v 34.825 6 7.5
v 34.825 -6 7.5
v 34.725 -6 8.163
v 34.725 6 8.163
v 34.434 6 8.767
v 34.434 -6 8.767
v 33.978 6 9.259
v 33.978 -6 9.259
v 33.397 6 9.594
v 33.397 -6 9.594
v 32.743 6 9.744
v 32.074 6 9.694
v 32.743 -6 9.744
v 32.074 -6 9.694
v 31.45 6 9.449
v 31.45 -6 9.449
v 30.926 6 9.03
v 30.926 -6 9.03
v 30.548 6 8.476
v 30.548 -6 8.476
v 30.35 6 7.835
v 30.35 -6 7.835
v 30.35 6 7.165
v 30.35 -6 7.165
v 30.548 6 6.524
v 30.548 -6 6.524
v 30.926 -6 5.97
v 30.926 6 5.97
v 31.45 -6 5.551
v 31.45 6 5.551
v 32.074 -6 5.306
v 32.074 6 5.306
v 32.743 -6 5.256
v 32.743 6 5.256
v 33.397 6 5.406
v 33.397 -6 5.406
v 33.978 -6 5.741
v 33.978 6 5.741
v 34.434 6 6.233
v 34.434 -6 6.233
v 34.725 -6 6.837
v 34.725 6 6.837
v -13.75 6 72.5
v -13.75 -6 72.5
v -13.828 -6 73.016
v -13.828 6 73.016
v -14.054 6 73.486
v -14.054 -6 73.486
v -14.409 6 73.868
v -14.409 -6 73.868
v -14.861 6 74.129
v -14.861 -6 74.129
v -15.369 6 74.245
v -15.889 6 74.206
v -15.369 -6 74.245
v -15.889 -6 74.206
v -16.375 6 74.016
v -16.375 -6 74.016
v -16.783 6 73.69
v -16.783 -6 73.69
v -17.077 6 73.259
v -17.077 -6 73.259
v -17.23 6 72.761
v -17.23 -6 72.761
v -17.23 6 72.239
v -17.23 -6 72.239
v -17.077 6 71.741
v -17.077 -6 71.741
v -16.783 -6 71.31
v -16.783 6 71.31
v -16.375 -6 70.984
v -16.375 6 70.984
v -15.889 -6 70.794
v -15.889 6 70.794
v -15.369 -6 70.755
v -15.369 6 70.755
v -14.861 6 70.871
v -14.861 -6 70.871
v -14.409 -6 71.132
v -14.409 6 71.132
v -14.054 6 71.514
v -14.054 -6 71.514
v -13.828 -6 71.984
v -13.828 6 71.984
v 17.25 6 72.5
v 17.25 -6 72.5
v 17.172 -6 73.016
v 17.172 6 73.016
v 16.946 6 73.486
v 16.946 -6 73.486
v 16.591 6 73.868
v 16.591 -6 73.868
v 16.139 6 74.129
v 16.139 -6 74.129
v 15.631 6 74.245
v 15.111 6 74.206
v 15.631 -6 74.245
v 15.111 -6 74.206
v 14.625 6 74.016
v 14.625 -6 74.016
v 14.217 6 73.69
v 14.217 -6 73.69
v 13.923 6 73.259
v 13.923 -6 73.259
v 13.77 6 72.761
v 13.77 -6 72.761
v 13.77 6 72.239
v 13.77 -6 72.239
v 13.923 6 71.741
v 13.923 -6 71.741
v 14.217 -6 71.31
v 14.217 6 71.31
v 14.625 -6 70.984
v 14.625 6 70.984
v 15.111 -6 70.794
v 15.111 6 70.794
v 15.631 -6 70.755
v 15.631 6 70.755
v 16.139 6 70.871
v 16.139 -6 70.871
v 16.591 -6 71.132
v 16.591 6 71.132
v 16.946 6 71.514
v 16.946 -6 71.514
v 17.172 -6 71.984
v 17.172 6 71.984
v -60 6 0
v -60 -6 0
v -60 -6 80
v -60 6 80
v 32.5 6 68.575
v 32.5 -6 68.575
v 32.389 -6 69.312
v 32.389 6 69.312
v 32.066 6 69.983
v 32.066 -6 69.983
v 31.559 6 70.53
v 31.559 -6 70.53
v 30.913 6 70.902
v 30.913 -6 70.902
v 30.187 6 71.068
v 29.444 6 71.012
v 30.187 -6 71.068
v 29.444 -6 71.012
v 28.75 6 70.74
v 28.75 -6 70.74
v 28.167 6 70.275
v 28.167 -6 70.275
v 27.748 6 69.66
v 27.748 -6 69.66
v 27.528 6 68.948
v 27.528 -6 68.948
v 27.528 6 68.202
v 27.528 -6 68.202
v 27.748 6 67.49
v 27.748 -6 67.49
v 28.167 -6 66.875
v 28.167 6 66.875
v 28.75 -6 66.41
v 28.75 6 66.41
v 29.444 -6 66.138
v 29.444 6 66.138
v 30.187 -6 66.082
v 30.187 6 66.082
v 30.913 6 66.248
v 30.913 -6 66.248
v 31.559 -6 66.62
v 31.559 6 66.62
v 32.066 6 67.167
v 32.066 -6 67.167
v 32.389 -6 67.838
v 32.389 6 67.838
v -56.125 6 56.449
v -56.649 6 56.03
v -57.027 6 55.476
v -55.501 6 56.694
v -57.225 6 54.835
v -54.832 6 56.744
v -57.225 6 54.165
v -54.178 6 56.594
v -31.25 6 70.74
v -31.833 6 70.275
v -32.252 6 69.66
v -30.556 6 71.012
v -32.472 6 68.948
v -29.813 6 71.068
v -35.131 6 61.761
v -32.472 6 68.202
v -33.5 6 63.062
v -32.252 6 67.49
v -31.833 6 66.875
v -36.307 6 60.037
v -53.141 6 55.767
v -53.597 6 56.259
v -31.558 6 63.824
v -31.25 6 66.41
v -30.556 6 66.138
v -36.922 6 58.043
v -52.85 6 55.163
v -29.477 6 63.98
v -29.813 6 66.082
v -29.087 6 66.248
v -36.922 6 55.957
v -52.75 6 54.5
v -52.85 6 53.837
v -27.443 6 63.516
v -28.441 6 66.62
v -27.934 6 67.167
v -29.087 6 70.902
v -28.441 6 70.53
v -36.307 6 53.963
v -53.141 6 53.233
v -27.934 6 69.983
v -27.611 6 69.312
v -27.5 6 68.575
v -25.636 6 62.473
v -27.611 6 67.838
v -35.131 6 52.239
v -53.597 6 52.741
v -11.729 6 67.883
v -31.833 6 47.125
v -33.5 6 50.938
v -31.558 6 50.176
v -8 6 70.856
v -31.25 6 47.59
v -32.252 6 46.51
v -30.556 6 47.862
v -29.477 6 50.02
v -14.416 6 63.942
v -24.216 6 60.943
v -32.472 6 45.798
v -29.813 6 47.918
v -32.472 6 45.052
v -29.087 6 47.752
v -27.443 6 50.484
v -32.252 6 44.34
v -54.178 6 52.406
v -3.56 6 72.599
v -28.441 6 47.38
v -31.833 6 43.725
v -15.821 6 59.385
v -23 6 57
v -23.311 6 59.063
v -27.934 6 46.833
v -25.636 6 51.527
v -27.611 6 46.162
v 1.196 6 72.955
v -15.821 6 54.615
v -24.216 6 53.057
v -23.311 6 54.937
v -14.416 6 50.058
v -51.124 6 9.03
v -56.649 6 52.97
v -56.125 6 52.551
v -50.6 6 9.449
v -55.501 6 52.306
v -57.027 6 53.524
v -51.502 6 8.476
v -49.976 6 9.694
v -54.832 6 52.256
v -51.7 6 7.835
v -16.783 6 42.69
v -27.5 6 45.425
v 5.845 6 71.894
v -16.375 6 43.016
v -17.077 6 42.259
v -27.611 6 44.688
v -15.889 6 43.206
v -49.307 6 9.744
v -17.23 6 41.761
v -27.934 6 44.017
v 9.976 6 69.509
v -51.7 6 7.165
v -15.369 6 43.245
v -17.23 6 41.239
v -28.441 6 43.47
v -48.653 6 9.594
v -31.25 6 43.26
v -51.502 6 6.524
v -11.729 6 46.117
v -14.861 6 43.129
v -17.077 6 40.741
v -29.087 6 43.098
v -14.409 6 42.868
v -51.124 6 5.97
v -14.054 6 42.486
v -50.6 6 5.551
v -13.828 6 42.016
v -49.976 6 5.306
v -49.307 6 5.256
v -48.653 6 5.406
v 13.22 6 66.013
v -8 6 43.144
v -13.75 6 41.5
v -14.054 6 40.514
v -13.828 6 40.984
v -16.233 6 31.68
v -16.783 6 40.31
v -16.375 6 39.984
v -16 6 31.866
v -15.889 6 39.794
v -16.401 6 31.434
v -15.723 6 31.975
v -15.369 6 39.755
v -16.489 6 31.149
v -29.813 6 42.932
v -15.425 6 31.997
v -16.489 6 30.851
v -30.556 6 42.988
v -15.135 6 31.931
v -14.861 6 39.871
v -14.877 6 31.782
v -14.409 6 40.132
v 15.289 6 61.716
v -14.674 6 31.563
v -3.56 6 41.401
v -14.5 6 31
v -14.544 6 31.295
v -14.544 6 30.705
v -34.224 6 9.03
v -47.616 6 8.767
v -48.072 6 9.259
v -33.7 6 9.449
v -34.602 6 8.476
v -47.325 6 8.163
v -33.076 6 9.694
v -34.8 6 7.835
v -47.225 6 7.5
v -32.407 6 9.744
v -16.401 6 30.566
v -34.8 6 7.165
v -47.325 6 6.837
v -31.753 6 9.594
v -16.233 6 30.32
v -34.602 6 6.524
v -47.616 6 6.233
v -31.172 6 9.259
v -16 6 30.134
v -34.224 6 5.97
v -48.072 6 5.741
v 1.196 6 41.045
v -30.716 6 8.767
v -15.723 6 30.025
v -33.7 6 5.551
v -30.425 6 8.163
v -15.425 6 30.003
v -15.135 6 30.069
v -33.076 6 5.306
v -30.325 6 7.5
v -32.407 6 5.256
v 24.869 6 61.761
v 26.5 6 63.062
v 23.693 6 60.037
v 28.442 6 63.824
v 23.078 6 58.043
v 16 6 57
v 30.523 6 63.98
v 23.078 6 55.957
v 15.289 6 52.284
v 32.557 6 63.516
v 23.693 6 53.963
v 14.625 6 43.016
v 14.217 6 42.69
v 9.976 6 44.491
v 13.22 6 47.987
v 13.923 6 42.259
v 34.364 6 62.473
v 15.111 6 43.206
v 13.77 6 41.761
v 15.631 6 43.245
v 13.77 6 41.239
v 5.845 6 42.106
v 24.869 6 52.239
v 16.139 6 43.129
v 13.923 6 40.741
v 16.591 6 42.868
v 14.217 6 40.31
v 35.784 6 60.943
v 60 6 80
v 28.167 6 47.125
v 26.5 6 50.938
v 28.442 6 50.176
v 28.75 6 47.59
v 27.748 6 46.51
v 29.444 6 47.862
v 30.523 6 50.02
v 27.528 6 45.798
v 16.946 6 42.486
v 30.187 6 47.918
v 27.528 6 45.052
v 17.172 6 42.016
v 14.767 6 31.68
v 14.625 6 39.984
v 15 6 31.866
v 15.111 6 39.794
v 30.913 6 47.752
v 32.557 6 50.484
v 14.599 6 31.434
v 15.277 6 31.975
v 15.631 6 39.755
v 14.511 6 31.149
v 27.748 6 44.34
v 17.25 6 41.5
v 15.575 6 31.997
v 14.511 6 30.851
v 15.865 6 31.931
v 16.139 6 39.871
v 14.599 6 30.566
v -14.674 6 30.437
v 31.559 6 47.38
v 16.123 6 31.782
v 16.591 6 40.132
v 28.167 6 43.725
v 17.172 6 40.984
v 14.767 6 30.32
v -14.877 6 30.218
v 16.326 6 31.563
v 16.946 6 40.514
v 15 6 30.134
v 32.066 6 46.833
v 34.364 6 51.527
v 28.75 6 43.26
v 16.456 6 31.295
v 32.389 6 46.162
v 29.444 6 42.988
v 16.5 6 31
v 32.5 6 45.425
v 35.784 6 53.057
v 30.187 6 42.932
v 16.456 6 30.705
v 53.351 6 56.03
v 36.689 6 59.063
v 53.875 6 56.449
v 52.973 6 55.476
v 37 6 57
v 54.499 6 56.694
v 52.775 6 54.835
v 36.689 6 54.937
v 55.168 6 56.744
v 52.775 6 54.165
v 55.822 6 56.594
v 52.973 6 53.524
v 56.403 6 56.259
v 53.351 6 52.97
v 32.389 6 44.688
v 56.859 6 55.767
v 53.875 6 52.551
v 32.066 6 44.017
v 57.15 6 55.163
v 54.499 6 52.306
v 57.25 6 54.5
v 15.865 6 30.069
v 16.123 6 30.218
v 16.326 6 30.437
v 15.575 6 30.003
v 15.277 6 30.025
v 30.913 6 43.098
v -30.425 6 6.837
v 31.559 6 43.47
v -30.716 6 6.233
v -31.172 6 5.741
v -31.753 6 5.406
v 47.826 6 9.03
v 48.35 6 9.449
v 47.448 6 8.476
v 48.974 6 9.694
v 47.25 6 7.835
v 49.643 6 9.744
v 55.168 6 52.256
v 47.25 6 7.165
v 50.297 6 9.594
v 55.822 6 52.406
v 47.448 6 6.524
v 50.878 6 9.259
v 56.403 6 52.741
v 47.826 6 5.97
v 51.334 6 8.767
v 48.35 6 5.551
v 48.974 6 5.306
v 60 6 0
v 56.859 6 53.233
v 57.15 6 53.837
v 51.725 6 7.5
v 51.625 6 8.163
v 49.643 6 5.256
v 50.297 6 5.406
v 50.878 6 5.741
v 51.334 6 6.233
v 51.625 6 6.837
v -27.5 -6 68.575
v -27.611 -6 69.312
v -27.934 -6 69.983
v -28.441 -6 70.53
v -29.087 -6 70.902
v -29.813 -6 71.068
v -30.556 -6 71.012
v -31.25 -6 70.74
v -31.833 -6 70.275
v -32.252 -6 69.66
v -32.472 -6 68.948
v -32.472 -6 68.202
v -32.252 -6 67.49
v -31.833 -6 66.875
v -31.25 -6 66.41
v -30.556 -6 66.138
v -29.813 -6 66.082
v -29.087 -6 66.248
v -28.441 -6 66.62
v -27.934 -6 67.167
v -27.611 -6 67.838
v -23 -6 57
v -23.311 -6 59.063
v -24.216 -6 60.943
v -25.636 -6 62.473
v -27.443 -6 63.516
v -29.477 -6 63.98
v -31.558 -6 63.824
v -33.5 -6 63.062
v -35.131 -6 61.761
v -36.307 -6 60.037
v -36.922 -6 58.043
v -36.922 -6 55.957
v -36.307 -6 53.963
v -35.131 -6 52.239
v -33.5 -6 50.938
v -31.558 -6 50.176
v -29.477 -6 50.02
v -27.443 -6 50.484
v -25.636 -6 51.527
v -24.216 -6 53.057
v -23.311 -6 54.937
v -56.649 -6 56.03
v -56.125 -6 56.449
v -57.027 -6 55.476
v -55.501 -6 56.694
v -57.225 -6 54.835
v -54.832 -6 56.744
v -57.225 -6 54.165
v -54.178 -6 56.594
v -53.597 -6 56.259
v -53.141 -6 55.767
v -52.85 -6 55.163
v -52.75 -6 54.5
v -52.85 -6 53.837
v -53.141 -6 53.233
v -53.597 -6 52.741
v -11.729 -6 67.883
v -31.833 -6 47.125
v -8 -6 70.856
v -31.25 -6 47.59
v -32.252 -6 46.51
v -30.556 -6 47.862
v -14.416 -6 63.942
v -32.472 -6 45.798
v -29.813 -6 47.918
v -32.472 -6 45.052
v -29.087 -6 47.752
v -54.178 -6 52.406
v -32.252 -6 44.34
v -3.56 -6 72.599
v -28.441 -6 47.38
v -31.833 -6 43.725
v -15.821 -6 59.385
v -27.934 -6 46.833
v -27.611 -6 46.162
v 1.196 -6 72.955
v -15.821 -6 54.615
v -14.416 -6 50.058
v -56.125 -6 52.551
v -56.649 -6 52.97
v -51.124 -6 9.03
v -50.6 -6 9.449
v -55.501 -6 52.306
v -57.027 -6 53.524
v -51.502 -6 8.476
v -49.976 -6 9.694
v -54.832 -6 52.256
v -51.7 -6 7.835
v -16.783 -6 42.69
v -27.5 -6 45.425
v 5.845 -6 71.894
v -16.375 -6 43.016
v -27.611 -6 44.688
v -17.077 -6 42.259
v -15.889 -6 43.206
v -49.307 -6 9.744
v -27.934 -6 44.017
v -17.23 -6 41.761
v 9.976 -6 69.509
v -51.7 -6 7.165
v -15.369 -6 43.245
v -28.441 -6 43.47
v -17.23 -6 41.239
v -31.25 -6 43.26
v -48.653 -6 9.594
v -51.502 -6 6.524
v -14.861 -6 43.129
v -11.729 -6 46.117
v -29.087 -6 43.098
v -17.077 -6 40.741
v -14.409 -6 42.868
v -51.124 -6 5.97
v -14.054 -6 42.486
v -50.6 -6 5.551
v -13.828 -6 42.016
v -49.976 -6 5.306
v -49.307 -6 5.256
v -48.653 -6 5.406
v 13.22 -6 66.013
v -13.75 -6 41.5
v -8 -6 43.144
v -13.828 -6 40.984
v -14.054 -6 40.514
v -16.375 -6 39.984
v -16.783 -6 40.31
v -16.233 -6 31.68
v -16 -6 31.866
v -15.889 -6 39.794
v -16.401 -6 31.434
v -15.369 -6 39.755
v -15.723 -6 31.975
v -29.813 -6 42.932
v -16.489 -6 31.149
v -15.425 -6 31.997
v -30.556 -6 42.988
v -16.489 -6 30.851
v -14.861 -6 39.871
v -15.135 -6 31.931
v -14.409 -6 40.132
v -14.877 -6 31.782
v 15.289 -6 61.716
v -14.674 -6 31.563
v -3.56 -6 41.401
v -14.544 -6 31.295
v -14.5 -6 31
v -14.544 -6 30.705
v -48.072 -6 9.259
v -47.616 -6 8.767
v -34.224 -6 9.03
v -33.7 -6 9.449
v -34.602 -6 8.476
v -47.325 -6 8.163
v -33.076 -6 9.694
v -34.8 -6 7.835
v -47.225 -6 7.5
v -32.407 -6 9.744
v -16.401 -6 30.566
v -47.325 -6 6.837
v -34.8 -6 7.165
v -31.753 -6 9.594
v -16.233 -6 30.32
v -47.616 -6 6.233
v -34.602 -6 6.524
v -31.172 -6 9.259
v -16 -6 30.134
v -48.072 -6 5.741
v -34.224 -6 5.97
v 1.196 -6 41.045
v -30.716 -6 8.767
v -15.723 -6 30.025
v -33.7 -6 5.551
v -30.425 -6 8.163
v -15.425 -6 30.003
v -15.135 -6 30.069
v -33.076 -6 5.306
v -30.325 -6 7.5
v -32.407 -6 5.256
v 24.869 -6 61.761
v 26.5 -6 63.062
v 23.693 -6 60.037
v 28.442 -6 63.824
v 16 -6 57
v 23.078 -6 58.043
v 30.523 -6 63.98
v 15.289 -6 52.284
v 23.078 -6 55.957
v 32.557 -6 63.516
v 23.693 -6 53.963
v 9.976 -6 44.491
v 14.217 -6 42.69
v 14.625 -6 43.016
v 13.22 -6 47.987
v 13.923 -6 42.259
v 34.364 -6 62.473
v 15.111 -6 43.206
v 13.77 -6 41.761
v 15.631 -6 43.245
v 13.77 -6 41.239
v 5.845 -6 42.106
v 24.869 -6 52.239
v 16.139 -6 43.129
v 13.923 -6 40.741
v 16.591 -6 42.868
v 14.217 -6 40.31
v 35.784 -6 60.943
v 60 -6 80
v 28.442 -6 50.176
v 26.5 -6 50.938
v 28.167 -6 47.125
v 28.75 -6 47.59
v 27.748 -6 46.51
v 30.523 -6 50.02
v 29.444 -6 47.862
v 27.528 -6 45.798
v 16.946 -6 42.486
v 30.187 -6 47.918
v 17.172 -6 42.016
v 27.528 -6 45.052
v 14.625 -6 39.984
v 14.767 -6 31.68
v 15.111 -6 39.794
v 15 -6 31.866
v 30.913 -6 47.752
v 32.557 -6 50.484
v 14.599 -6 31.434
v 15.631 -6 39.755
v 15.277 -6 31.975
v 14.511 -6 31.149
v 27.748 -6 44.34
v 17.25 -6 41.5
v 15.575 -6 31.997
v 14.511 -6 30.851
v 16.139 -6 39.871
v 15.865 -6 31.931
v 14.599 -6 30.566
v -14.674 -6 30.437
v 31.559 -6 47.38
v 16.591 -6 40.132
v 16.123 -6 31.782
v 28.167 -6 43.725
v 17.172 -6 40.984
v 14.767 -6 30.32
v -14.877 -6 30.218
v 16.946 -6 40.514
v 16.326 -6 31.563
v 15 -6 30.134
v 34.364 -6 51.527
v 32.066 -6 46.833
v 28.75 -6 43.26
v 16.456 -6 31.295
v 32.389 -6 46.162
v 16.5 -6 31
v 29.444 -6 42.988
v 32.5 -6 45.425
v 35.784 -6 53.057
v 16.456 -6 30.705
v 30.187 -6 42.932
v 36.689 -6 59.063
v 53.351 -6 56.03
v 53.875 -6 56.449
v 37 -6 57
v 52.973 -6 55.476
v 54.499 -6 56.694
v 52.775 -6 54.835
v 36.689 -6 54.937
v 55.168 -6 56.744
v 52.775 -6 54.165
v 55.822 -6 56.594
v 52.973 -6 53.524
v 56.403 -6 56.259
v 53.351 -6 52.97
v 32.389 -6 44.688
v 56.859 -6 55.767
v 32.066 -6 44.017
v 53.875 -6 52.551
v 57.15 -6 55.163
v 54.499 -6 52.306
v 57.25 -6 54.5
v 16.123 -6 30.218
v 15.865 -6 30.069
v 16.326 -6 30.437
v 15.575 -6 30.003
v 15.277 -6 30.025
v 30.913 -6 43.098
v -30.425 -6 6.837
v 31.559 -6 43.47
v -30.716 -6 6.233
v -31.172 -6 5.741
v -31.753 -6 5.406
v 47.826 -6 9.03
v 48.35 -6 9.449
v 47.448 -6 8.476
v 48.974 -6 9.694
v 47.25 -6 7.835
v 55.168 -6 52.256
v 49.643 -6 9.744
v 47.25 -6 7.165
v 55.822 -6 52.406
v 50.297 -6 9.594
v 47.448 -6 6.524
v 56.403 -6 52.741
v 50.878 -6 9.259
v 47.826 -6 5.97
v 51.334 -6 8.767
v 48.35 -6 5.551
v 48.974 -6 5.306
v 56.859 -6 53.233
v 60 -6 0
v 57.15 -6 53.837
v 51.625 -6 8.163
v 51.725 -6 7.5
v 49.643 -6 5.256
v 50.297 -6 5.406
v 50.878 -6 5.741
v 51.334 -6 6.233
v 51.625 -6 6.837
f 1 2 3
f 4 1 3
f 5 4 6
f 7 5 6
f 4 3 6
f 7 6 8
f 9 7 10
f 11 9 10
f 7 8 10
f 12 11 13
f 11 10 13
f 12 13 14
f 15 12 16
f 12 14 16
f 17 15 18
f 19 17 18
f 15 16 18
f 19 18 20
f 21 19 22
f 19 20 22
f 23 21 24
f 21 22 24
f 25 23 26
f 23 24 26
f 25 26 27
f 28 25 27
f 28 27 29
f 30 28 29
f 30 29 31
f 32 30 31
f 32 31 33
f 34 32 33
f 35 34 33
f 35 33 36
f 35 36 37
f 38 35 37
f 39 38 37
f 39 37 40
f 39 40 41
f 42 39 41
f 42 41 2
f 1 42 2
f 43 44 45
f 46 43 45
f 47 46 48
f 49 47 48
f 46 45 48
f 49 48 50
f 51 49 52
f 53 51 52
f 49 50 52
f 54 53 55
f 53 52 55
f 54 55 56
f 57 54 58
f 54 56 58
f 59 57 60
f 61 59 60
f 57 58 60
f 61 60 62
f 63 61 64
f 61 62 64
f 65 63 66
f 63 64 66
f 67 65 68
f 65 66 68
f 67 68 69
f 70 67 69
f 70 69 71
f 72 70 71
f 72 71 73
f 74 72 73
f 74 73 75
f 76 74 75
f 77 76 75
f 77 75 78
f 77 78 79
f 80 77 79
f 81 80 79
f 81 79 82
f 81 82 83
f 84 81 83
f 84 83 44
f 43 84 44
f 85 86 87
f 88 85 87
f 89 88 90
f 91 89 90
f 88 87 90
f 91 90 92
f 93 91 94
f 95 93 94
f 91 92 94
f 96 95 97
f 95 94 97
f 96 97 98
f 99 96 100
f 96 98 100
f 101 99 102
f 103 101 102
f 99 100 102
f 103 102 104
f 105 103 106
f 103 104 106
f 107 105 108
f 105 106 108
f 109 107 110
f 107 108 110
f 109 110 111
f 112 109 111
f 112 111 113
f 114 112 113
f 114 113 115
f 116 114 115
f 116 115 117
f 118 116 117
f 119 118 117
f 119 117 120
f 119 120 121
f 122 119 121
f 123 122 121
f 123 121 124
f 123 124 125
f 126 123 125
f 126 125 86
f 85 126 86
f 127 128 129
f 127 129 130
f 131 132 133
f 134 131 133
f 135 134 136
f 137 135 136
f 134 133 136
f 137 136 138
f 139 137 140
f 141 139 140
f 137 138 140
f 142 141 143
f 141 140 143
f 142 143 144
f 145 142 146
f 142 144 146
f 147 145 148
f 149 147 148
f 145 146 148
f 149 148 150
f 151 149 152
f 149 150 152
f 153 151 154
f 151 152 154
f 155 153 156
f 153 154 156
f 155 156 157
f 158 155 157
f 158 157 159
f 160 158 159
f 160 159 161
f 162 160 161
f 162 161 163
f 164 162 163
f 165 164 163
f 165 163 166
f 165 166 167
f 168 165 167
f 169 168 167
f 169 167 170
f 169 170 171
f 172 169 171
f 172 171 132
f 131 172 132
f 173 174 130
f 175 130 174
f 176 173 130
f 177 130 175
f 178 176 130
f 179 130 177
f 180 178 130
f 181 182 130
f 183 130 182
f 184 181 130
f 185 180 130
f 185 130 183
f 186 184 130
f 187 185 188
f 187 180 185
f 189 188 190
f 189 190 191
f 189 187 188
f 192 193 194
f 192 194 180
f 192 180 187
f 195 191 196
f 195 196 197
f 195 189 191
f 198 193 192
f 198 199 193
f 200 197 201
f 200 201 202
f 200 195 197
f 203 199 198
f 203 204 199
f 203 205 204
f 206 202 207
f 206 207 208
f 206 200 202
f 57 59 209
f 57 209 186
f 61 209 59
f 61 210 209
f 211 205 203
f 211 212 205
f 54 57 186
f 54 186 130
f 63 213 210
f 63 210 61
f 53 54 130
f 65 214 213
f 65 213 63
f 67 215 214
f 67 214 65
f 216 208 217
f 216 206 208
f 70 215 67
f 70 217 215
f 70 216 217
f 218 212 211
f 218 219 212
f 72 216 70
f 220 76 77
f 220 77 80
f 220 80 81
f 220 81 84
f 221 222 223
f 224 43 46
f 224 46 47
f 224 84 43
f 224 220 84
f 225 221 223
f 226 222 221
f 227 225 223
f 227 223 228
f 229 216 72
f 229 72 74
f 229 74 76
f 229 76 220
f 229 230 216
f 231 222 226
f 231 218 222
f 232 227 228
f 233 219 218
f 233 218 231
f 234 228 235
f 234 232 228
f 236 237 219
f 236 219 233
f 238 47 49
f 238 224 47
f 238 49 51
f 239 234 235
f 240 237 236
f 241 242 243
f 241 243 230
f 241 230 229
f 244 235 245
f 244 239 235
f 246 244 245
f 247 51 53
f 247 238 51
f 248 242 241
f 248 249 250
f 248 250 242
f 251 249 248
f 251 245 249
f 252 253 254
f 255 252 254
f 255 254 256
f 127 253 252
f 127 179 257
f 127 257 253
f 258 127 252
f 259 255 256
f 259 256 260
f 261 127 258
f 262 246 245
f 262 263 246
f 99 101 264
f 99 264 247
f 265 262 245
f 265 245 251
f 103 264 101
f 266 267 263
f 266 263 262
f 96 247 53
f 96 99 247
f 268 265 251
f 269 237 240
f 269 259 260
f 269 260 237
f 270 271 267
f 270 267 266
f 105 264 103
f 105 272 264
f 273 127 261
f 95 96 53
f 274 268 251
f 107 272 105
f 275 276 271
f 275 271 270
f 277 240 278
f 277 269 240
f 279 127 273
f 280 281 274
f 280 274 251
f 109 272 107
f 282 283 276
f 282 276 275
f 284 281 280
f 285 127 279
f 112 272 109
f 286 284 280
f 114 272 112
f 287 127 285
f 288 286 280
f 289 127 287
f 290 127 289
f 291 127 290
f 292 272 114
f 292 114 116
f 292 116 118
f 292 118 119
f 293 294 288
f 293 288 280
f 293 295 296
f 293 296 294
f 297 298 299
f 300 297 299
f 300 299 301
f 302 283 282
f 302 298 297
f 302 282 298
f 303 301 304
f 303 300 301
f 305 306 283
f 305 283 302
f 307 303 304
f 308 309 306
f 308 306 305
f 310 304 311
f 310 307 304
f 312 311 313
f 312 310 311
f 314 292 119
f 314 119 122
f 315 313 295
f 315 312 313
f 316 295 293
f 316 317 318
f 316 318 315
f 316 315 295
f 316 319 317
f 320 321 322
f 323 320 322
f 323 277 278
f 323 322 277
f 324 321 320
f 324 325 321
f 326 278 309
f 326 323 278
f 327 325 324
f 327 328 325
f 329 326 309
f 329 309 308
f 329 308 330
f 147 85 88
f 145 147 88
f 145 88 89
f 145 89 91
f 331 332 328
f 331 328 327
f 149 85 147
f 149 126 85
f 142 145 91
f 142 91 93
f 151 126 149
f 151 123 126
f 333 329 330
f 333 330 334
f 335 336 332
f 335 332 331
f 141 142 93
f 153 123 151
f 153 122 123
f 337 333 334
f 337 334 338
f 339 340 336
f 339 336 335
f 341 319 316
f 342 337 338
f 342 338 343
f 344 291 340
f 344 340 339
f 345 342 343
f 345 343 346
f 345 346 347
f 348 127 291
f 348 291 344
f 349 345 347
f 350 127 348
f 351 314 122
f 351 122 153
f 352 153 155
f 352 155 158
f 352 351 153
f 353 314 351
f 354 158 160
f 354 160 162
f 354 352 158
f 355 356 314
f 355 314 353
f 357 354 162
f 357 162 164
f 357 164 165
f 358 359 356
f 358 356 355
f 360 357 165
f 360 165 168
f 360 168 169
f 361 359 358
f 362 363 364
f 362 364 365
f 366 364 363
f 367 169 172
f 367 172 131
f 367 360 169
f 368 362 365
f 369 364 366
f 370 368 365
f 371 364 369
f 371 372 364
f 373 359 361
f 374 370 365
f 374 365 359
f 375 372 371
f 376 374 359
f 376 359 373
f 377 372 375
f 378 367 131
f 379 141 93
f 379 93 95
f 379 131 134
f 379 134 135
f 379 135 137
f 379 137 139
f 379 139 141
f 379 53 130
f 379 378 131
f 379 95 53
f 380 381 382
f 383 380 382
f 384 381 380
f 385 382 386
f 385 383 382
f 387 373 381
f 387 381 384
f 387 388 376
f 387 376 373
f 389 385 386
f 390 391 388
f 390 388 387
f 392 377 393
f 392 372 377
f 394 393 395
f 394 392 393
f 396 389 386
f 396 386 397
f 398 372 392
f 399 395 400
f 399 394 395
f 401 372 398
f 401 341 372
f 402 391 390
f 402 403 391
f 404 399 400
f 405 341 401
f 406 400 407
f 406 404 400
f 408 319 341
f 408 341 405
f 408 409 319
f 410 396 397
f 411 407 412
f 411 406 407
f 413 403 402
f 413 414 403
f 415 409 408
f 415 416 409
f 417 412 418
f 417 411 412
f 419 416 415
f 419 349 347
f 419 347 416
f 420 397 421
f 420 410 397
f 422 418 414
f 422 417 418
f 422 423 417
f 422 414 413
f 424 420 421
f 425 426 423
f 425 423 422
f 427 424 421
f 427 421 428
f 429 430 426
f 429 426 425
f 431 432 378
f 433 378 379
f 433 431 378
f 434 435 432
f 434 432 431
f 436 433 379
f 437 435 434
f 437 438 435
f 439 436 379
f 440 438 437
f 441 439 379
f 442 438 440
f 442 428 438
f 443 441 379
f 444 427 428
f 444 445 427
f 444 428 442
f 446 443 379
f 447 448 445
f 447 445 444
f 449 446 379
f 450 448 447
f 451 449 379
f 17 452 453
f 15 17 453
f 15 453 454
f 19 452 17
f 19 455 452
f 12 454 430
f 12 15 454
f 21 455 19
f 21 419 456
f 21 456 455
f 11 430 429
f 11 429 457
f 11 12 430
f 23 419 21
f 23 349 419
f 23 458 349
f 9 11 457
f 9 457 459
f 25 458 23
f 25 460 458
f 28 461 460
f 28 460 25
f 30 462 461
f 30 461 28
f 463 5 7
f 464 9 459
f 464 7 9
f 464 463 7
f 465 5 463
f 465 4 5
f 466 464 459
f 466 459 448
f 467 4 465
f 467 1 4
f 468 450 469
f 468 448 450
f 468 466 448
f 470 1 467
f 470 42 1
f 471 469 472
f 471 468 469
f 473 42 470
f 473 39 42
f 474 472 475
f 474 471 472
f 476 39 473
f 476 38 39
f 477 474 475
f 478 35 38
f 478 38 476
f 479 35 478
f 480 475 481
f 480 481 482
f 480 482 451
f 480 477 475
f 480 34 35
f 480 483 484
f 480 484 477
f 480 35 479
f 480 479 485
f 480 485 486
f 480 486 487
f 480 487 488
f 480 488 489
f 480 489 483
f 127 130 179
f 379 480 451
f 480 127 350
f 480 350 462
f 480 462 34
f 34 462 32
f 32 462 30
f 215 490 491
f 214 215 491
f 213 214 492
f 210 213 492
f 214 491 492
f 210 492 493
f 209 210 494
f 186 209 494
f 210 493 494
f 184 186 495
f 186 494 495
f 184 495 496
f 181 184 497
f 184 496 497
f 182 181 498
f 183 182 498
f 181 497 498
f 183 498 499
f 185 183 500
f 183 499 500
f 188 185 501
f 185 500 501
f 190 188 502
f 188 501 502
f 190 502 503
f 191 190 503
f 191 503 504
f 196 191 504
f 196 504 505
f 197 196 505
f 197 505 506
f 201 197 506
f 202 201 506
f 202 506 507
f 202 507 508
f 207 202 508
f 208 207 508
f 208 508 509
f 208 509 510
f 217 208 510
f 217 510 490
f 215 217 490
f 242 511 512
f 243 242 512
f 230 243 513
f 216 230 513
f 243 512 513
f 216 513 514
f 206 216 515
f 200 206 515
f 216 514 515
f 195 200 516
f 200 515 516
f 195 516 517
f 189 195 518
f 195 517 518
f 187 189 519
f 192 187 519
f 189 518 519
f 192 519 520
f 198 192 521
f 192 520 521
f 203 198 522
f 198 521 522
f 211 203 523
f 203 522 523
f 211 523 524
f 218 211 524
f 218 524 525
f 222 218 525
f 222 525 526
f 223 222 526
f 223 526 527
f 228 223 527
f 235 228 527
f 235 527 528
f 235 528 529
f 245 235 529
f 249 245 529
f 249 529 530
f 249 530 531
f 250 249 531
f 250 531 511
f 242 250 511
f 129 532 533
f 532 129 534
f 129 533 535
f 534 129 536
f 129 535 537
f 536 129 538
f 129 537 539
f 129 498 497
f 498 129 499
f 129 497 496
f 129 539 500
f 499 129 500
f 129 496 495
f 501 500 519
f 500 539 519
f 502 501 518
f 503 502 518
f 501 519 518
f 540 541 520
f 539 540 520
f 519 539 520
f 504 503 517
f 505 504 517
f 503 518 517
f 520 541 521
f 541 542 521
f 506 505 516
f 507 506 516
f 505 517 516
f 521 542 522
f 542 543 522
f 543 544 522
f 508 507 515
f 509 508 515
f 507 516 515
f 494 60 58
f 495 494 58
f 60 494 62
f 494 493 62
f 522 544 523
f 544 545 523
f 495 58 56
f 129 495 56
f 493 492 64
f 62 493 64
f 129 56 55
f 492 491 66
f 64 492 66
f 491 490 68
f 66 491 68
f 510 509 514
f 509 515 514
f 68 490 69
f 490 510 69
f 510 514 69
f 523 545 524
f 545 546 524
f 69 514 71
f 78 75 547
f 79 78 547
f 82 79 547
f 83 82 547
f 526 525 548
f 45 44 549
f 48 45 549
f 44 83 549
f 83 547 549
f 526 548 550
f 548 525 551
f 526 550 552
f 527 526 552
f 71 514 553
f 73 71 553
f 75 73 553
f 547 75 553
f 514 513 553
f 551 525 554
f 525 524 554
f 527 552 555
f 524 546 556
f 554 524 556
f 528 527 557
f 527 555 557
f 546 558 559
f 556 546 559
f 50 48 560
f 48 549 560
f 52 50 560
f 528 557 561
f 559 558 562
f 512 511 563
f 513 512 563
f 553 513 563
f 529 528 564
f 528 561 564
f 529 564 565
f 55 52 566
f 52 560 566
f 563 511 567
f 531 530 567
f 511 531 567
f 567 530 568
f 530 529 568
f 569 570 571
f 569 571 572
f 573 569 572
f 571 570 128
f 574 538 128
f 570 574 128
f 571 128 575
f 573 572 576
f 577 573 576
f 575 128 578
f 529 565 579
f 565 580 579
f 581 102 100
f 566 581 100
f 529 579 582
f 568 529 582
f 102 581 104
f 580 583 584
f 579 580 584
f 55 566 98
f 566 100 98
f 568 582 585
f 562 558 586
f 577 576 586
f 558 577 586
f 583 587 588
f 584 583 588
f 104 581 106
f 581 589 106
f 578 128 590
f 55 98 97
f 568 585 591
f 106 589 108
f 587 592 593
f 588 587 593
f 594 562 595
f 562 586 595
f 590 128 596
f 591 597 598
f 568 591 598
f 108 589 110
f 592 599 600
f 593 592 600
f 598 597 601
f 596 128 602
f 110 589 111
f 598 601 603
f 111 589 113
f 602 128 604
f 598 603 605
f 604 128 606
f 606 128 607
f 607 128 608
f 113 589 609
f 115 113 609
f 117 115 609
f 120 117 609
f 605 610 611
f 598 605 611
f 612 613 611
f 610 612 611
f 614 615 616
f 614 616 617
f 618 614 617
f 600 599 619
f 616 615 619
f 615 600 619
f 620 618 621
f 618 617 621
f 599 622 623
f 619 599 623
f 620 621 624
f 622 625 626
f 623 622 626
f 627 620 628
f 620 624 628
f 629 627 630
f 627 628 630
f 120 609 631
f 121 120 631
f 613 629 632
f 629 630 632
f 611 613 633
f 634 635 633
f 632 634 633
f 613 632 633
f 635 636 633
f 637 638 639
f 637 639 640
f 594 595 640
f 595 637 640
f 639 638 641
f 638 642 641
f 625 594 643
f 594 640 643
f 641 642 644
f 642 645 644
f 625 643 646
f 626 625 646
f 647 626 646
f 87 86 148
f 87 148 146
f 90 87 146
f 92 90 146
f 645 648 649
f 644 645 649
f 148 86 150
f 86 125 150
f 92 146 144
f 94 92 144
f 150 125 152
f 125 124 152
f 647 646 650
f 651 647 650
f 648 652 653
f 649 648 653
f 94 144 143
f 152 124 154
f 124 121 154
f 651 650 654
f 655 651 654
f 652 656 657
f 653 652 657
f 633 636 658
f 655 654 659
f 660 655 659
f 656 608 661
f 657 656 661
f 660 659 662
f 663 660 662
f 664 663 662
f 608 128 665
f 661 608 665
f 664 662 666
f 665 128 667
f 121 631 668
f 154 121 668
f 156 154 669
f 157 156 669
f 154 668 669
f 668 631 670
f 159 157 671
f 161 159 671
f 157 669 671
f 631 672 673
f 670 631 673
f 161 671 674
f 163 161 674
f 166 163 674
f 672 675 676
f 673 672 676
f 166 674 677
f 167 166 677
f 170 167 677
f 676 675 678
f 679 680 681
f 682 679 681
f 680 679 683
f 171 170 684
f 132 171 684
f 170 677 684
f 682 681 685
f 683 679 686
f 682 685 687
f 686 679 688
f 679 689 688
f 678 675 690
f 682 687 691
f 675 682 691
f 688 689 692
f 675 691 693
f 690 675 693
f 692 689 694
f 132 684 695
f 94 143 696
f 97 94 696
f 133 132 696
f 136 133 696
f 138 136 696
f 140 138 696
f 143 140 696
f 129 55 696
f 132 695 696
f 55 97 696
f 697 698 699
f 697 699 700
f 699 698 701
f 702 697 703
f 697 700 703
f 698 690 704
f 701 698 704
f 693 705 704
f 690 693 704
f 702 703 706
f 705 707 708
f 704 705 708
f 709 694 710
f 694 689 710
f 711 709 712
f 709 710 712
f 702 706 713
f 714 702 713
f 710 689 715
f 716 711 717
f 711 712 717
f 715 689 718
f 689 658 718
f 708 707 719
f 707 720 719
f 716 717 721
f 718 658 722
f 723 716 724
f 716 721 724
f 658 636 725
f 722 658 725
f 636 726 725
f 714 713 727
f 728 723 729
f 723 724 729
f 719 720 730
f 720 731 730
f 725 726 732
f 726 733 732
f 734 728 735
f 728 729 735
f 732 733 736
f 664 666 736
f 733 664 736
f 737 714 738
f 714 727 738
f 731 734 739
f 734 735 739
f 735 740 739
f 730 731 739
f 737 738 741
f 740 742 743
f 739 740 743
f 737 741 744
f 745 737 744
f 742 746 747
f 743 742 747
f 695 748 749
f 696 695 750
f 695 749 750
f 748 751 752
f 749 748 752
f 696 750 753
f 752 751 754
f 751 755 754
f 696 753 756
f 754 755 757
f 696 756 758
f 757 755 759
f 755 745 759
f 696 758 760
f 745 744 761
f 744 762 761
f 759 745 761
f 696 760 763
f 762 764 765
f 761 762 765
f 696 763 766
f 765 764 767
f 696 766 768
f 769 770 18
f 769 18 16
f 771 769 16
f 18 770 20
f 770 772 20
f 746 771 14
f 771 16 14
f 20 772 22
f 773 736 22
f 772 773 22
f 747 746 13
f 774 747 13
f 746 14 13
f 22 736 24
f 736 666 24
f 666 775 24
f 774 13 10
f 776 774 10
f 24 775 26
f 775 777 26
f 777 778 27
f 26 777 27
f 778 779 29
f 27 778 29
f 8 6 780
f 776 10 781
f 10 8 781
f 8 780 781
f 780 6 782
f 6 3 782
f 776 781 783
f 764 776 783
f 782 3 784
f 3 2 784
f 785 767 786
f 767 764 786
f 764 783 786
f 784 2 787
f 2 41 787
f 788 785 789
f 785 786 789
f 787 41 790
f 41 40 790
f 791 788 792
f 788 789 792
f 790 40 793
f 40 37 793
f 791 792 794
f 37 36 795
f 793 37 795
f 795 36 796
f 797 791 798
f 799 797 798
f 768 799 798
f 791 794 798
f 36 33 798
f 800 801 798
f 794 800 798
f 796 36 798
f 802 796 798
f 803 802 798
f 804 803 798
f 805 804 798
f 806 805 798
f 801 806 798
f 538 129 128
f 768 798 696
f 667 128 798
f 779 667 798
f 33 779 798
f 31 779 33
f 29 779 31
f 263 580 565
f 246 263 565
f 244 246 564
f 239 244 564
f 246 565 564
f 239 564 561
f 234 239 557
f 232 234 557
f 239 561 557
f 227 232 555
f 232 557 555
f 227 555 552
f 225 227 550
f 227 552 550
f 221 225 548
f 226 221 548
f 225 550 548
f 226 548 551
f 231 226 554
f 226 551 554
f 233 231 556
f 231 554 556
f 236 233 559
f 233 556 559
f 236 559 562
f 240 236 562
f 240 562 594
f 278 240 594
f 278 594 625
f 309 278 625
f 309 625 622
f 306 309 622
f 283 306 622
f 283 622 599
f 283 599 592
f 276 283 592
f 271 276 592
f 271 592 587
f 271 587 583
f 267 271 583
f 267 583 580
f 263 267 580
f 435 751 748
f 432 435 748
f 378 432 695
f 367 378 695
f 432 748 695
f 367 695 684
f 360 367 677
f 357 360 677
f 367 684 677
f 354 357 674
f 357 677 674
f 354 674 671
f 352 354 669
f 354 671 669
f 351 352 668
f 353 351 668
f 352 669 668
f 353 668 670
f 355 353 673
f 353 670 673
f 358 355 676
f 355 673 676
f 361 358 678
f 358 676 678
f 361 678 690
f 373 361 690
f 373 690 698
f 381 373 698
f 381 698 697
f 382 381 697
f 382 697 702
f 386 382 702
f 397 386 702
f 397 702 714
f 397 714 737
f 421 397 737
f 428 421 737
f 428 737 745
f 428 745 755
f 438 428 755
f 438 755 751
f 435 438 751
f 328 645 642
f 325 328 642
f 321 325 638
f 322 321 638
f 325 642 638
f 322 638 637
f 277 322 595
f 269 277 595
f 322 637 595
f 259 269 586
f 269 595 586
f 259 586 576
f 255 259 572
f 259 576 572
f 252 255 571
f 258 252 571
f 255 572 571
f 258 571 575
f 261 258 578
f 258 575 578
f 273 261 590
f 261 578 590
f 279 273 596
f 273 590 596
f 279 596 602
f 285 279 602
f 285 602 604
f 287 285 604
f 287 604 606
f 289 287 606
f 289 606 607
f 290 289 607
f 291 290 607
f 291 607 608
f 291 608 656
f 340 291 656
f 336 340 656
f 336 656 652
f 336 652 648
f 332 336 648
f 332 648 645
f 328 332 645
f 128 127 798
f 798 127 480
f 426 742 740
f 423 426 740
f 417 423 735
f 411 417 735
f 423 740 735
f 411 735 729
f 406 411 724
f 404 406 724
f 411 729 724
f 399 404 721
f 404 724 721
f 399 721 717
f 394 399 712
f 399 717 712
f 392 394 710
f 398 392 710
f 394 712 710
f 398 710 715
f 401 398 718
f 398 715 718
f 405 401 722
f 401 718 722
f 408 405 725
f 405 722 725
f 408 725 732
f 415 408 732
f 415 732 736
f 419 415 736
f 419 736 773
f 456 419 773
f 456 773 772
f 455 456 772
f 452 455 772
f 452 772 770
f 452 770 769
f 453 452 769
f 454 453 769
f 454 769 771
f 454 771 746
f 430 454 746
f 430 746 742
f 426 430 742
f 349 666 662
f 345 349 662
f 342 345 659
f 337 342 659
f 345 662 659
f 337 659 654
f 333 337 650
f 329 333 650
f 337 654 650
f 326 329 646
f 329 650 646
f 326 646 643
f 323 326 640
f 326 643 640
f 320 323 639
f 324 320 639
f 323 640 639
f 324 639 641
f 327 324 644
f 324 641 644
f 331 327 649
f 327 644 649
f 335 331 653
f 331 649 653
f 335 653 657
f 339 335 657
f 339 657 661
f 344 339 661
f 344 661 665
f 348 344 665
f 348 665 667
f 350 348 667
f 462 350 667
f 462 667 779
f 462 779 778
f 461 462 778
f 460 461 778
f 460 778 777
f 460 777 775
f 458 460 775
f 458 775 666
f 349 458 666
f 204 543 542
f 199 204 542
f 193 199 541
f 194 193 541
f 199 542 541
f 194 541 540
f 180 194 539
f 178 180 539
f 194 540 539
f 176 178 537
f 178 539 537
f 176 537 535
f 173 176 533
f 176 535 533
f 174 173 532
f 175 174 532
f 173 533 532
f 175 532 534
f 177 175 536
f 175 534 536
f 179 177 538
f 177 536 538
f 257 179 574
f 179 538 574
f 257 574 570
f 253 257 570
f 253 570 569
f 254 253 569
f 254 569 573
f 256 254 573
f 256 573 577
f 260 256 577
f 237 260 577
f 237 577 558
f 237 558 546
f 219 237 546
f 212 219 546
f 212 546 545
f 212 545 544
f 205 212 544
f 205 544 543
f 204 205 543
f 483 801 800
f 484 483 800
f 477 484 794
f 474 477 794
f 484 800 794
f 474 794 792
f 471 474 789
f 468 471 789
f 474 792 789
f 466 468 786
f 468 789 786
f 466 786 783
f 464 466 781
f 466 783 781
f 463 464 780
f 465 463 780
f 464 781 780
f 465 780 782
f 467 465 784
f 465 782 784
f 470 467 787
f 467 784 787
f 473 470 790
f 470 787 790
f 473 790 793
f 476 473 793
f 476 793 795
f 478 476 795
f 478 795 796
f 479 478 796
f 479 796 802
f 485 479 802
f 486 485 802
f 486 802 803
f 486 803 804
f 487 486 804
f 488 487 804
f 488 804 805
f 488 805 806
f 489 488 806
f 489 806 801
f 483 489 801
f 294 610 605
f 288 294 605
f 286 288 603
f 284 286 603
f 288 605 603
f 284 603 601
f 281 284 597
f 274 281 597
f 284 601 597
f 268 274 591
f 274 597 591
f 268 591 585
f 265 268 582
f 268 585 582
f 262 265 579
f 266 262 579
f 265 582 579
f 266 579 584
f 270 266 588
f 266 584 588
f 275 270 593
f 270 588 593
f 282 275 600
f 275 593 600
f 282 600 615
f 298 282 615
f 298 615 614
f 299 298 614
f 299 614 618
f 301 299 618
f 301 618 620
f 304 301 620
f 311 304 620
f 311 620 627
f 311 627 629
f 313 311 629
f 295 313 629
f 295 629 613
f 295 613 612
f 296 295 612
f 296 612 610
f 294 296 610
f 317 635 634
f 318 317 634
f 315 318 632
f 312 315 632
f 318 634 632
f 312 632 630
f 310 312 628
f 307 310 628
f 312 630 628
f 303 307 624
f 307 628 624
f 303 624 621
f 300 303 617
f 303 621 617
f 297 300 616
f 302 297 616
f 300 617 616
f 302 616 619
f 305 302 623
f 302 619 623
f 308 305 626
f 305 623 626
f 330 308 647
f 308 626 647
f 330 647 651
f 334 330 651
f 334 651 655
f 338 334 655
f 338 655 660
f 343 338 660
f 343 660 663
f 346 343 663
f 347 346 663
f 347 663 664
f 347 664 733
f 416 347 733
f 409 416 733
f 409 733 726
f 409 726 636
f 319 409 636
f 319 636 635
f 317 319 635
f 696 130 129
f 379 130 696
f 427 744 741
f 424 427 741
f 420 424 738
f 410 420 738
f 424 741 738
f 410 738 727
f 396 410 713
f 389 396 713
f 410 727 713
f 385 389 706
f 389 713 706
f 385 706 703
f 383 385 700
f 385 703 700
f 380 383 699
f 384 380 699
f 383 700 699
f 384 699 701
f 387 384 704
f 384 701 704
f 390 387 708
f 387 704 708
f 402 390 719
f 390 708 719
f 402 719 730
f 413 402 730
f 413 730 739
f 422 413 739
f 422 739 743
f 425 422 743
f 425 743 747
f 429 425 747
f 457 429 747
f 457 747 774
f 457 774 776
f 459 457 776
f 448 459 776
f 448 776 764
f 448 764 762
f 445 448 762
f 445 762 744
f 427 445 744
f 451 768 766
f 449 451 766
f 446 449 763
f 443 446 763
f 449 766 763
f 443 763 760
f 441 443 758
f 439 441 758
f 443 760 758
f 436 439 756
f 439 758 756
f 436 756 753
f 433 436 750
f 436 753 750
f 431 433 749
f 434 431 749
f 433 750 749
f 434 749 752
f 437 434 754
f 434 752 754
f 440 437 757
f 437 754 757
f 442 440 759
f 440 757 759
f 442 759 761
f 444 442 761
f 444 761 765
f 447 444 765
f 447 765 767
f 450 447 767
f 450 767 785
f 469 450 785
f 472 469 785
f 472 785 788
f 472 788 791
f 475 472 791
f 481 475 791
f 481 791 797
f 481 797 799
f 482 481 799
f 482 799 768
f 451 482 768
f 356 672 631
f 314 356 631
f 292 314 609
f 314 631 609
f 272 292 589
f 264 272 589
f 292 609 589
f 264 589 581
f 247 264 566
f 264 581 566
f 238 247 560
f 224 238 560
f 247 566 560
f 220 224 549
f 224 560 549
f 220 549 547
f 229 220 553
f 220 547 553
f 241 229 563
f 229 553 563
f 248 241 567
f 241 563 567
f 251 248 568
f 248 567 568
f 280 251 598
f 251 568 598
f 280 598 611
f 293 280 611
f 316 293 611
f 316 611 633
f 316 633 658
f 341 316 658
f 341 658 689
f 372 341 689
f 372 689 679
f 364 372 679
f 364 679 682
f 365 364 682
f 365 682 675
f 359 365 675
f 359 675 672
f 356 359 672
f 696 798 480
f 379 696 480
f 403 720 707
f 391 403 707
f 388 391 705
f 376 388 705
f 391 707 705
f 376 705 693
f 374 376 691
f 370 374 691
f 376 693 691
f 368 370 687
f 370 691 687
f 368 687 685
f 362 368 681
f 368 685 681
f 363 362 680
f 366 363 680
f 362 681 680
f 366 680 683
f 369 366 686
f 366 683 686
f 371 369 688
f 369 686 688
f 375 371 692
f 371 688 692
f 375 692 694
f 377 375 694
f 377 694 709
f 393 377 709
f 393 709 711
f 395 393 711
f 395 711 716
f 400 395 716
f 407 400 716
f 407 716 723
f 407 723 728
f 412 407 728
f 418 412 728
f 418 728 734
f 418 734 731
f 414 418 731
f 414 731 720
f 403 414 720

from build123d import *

# Parameters (mm, degrees)
SKETCH_W      = 120
SKETCH_H      = 12
PAD_DEPTH     = 80
SKETCH001_R   = 2.25
SKETCH001_R_2 = 7
SKETCH001_R_3 = 16
SKETCH001_R_4 = 1.75
SKETCH001_R_5 = 2.5
SKETCH001_R_6 = 1
POCKET_DEPTH  = 12.001


with BuildPart() as part:
    # Sketch → Pad (new body)
    with BuildSketch(Plane.XY):
        Rectangle(SKETCH_W, SKETCH_H)
    extrude(amount=PAD_DEPTH)

    # Sketch001 → Pocket (cut, through all)
    with BuildSketch(Plane.XZ.offset(6)):
        with Locations((-49.475, 7.5)):
            Circle(SKETCH001_R)
        with Locations((-32.575, 7.5)):
            Circle(SKETCH001_R)
        with Locations((32.575, 7.5)):
            Circle(SKETCH001_R)
        with Locations((49.475, 7.5)):
            Circle(SKETCH001_R)
        with Locations((-30, 57)):
            Circle(SKETCH001_R_2)
        with Locations((30, 57)):
            Circle(SKETCH001_R_2)
        with Locations((0, 57)):
            Circle(SKETCH001_R_3)
        with Locations((-15.5, 72.5)):
            Circle(SKETCH001_R_4)
        with Locations((-15.5, 41.5)):
            Circle(SKETCH001_R_4)
        with Locations((15.5, 41.5)):
            Circle(SKETCH001_R_4)
        with Locations((15.5, 72.5)):
            Circle(SKETCH001_R_4)
        with Locations((-30, 68.575)):
            Circle(SKETCH001_R_5)
        with Locations((-30, 45.425)):
            Circle(SKETCH001_R_5)
        with Locations((30, 68.575)):
            Circle(SKETCH001_R_5)
        with Locations((30, 45.425)):
            Circle(SKETCH001_R_5)
        with Locations((-55, 54.5)):
            Circle(SKETCH001_R)
        with Locations((55, 54.5)):
            Circle(SKETCH001_R)
        with Locations((-15.5, 31)):
            Circle(SKETCH001_R_6)
        with Locations((15.5, 31)):
            Circle(SKETCH001_R_6)
    extrude(amount=-POCKET_DEPTH, mode=Mode.SUBTRACT)


solid = part.part
